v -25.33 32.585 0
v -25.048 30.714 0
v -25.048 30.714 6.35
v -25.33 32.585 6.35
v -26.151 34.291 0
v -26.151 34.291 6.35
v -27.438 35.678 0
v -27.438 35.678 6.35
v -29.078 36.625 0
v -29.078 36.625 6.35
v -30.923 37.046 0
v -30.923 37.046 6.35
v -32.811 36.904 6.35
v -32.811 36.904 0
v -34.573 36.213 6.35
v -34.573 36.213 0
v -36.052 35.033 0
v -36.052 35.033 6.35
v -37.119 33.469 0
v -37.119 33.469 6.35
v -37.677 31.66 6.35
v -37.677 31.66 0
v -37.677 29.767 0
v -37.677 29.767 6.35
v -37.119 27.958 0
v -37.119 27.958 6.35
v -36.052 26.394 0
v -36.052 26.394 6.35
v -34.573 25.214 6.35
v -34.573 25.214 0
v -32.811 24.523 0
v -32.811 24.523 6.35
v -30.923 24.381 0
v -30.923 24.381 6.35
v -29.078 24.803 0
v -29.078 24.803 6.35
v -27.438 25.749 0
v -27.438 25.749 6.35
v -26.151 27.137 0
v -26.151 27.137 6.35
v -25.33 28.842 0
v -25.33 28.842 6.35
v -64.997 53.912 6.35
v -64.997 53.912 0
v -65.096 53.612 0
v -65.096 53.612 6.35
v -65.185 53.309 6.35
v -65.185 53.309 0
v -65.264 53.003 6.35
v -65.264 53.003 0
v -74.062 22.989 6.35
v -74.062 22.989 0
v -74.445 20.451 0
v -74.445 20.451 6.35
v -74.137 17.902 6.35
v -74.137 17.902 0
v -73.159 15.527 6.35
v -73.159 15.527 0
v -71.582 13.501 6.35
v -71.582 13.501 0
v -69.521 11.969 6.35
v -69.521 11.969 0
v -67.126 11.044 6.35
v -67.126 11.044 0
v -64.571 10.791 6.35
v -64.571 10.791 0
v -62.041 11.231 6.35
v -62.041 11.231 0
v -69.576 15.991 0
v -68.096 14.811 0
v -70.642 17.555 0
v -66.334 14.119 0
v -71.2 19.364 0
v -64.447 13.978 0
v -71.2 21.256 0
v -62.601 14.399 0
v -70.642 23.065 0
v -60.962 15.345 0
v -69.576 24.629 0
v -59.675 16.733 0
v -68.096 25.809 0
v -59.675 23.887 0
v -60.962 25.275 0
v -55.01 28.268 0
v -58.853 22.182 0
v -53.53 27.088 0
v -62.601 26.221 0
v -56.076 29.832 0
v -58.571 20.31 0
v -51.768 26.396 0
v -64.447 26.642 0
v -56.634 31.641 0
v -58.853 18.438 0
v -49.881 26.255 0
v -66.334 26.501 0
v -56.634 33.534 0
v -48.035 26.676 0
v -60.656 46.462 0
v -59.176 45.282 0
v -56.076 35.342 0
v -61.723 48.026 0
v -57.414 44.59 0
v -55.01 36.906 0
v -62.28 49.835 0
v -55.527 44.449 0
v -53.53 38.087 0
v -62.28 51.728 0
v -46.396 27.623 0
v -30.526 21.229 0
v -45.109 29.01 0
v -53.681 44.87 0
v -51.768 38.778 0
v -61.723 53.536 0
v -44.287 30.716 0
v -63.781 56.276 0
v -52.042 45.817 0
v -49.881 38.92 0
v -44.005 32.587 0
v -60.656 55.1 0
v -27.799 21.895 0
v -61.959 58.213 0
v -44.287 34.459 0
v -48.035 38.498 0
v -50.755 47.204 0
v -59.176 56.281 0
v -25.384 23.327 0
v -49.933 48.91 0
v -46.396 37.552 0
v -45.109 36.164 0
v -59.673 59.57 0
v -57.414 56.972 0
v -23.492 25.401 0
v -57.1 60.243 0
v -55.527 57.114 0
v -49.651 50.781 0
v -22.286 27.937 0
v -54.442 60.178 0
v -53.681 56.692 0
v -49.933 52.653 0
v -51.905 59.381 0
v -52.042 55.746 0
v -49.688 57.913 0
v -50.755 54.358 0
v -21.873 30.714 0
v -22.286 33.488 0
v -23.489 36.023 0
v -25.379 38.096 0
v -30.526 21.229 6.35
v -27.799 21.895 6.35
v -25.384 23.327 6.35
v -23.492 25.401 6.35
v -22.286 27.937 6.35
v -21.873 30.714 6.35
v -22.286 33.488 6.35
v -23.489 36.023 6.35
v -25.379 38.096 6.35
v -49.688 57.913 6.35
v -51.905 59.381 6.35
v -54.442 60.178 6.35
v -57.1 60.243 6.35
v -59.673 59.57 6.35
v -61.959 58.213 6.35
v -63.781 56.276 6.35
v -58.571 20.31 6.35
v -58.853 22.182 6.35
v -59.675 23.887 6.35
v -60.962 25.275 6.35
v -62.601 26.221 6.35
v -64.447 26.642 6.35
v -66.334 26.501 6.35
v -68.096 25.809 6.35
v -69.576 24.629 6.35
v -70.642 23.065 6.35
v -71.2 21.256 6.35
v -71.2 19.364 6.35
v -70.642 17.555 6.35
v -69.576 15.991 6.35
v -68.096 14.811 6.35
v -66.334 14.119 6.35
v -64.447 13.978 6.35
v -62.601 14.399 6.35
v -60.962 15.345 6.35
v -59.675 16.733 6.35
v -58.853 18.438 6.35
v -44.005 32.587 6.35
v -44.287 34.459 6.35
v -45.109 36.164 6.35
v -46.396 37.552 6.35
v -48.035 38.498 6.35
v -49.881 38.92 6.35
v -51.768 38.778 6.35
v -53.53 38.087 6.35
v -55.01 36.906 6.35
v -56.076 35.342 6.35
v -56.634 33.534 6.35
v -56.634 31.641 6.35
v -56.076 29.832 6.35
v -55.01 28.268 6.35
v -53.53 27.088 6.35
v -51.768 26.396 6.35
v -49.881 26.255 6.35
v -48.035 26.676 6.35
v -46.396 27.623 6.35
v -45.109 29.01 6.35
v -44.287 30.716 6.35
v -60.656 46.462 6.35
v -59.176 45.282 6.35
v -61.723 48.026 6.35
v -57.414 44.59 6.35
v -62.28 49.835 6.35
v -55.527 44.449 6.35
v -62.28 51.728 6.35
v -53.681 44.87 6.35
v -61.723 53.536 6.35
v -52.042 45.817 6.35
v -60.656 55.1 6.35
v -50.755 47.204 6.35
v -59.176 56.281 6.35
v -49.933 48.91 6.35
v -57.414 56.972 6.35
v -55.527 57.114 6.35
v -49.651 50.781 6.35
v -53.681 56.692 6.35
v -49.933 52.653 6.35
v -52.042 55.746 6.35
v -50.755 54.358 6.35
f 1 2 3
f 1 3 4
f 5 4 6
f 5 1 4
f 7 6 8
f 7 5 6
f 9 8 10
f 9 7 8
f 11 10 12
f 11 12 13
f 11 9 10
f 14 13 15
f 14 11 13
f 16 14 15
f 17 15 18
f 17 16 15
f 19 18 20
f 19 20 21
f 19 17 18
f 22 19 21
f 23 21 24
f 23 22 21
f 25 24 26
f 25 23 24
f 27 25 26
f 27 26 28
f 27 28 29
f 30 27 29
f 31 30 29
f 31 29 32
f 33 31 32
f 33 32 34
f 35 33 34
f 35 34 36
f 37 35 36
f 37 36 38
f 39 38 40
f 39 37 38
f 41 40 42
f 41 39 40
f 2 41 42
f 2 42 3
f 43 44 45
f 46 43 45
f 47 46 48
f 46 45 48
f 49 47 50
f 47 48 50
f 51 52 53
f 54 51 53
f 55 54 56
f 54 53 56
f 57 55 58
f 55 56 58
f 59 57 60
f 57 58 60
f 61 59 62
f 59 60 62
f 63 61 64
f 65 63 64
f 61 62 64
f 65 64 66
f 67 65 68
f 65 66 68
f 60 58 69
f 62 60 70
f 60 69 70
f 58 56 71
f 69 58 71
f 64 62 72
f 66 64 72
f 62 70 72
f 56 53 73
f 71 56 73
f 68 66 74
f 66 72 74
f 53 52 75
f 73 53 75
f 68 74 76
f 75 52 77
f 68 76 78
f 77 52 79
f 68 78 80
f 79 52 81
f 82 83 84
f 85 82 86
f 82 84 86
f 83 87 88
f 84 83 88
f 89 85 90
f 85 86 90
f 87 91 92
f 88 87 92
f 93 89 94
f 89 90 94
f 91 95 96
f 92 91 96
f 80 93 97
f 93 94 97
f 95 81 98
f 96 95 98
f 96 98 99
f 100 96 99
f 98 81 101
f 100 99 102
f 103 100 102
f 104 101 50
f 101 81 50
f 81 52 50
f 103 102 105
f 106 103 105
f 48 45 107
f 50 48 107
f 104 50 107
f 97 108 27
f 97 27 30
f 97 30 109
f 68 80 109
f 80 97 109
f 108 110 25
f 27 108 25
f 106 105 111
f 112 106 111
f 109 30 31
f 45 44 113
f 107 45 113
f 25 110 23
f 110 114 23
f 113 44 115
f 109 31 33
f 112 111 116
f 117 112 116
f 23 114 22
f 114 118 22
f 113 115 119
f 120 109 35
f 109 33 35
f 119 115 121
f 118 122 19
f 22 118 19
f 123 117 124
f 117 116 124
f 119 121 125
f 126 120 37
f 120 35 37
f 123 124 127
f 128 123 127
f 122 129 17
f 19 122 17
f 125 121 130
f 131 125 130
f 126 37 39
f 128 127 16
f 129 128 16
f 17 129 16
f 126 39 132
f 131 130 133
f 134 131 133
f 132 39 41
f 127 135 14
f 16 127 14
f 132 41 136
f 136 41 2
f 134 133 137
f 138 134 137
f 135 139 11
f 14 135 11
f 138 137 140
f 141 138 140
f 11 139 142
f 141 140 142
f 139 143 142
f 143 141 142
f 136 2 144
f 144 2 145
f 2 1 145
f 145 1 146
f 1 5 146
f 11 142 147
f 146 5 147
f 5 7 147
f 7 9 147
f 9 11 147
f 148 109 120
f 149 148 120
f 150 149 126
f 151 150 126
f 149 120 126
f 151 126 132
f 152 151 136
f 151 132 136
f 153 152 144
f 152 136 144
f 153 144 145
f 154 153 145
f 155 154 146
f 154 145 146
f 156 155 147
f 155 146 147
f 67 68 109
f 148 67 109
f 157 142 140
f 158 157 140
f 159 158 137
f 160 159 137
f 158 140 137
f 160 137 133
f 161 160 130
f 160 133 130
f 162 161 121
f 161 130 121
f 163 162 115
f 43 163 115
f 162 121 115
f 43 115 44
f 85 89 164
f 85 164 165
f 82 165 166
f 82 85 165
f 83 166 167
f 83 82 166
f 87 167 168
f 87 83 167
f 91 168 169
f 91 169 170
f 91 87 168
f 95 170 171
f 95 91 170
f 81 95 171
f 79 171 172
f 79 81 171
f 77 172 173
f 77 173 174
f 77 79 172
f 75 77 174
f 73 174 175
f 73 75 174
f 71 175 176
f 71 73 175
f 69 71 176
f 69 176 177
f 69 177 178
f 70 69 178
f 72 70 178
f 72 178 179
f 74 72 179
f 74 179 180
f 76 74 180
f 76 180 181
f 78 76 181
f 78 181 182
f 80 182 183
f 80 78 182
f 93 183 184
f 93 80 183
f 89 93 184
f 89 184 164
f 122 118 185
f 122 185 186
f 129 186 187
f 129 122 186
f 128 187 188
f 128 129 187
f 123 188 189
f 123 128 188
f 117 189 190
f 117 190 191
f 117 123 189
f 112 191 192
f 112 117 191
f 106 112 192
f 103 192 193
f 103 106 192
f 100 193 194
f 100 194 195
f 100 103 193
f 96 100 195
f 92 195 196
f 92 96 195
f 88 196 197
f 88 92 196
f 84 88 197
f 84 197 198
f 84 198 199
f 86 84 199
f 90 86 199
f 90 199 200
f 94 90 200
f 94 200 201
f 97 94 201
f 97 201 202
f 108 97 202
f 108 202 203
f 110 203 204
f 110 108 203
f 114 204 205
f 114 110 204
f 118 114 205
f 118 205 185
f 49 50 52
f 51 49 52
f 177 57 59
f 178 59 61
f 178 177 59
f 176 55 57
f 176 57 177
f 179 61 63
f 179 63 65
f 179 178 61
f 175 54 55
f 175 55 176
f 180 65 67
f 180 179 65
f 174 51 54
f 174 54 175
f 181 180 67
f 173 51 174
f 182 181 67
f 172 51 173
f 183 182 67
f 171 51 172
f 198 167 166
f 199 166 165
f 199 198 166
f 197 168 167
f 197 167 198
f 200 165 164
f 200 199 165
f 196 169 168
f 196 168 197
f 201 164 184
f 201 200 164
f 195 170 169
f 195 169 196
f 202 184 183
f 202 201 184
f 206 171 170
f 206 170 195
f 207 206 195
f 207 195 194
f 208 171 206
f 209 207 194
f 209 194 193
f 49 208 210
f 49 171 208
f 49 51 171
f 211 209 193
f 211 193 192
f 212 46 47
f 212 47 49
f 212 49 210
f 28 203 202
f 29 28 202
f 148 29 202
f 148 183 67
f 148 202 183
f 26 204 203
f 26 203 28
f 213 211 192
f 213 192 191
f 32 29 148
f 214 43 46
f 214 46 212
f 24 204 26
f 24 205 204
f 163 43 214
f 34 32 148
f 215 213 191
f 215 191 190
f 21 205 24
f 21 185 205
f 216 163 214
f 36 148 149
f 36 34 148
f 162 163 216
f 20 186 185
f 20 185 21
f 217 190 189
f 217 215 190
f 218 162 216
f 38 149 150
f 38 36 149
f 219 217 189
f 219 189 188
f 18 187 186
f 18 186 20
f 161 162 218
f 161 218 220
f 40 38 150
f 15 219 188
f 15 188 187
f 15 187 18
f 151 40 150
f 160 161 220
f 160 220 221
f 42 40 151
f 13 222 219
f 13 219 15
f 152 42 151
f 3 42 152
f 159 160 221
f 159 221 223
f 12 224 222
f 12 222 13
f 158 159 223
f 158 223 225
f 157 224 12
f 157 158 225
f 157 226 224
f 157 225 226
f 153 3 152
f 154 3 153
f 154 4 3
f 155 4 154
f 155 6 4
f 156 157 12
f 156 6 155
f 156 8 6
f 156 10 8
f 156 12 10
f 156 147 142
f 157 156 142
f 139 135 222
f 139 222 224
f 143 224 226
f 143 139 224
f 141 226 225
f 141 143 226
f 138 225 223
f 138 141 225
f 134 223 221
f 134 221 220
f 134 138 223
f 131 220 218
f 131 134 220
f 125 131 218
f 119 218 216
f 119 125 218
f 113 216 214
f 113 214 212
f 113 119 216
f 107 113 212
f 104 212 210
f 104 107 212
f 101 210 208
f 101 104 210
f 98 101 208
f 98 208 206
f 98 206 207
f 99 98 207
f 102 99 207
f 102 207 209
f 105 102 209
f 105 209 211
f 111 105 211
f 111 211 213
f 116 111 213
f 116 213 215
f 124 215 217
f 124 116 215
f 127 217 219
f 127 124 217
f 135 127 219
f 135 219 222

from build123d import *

# Parameters (mm, degrees)
F0_R     = 6.35
F1_DEPTH = 6.35


with BuildPart() as f1:
    # F0 (on Top) → F1 (new body)
    with BuildSketch(Plane.XY):
        with BuildLine():
            ThreePointArc((-53.1782564477, 41.6842693984), (-48.3327406635, 45.1317048361), (-46.4763714082, 50.7812824752))
            ThreePointArc((-46.4763714082, 50.7812824752), (-47.3162680415, 54.6921141654), (-49.6878369219, 57.9132462503))
            ThreePointArc((-49.6878369219, 57.9132462503), (-58.4100557825, 59.9966969849), (-64.9972519962, 53.911738903))
            Line((-64.9972519962, 53.911738903), (-65.2636588151, 53.0029163317))
            ThreePointArc((-65.2636588151, 53.0029163317), (-62.5124141472, 43.8291642763), (-53.1782564477, 41.6842693984))
        make_face()
        with Locations((-56.0013714082, 50.7812824752)):
            Circle(F0_R, mode=Mode.SUBTRACT)
        with BuildLine():
            Line((-65.2636588151, 53.0029163317), (-64.9972519962, 53.911738903))
            ThreePointArc((-64.9972519962, 53.911738903), (-65.1417578469, 53.4606407474), (-65.2636588151, 53.0029163317))
        make_face()
        with BuildLine():
            ThreePointArc((-21.8725080792, 30.7135868106), (-22.7936822086, 34.8001263475), (-25.3790288954, 38.096237643))
            ThreePointArc((-25.3790288954, 38.096237643), (-35.0554610731, 39.5081877051), (-40.8763247582, 31.6504215705))
            ThreePointArc((-40.8763247582, 31.6504215705), (-38.1559117236, 24.0016865446), (-30.5261420942, 21.2285277006))
            ThreePointArc((-30.5261420942, 21.2285277006), (-24.3609824448, 24.29385691), (-21.8725080792, 30.7135868106))
        make_face()
        with Locations((-31.3975080792, 30.7135868106)):
            Circle(F0_R, mode=Mode.SUBTRACT)
        with BuildLine():
            ThreePointArc((-55.3962625933, 20.3100166458), (-55.9742861224, 23.5776208185), (-57.638202127, 26.4486366246))
            ThreePointArc((-57.638202127, 26.4486366246), (-66.8844329452, 29.6305095066), (-74.061649032, 22.989374918))
            ThreePointArc((-74.061649032, 22.989374918), (-71.5818043374, 13.5009925839), (-62.0410610516, 11.2309162454))
            ThreePointArc((-62.0410610516, 11.2309162454), (-57.2349258623, 14.6845519842), (-55.3962625933, 20.3100166458))
        make_face()
        with Locations((-64.9212625933, 20.3100166458)):
            Circle(F0_R, mode=Mode.SUBTRACT)
        with BuildLine():
            ThreePointArc((-57.638202127, 26.4486366246), (-59.4965211645, 35.2632237636), (-53.1782564477, 41.6842693984))
            ThreePointArc((-53.1782564477, 41.6842693984), (-62.5124141472, 43.8291642763), (-65.2636588151, 53.0029163317))
            Line((-65.2636588151, 53.0029163317), (-74.061649032, 22.989374918))
            ThreePointArc((-74.061649032, 22.989374918), (-66.8844329452, 29.6305095066), (-57.638202127, 26.4486366246))
        make_face()
        with BuildLine():
            ThreePointArc((-49.6878369219, 57.9132462503), (-47.3162680415, 54.6921141654), (-46.4763714082, 50.7812824752))
            ThreePointArc((-46.4763714082, 50.7812824752), (-48.3327406635, 45.1317048361), (-53.1782564477, 41.6842693984))
            ThreePointArc((-53.1782564477, 41.6842693984), (-44.7055638187, 40.2558870979), (-40.8301414364, 32.5872563373))
            ThreePointArc((-40.8301414364, 32.5872563373), (-40.841694273, 32.1182701223), (-40.8763247582, 31.6504215705))
            ThreePointArc((-40.8763247582, 31.6504215705), (-35.0554610731, 39.5081877051), (-25.3790288954, 38.096237643))
            Line((-25.3790288954, 38.096237643), (-49.6878369219, 57.9132462503))
        make_face()
        with BuildLine():
            ThreePointArc((-40.8763247582, 31.6504215705), (-47.5320265353, 23.4902432421), (-57.638202127, 26.4486366246))
            ThreePointArc((-57.638202127, 26.4486366246), (-55.9742861224, 23.5776208185), (-55.3962625933, 20.3100166458))
            ThreePointArc((-55.3962625933, 20.3100166458), (-57.2349258623, 14.6845519842), (-62.0410610516, 11.2309162454))
            Line((-62.0410610516, 11.2309162454), (-30.5261420942, 21.2285277006))
            ThreePointArc((-30.5261420942, 21.2285277006), (-38.1559117236, 24.0016865446), (-40.8763247582, 31.6504215705))
        make_face()
        with BuildLine():
            ThreePointArc((-40.8301414364, 32.5872563373), (-44.7055638187, 40.2558870979), (-53.1782564477, 41.6842693984))
            ThreePointArc((-53.1782564477, 41.6842693984), (-59.4965211645, 35.2632237636), (-57.638202127, 26.4486366246))
            ThreePointArc((-57.638202127, 26.4486366246), (-47.5320265353, 23.4902432421), (-40.8763247582, 31.6504215705))
            ThreePointArc((-40.8763247582, 31.6504215705), (-40.841694273, 32.1182701223), (-40.8301414364, 32.5872563373))
        make_face()
        with Locations((-50.3551414364, 32.5872563373)):
            Circle(F0_R, mode=Mode.SUBTRACT)
    extrude(amount=F1_DEPTH)


solid = f1.part
